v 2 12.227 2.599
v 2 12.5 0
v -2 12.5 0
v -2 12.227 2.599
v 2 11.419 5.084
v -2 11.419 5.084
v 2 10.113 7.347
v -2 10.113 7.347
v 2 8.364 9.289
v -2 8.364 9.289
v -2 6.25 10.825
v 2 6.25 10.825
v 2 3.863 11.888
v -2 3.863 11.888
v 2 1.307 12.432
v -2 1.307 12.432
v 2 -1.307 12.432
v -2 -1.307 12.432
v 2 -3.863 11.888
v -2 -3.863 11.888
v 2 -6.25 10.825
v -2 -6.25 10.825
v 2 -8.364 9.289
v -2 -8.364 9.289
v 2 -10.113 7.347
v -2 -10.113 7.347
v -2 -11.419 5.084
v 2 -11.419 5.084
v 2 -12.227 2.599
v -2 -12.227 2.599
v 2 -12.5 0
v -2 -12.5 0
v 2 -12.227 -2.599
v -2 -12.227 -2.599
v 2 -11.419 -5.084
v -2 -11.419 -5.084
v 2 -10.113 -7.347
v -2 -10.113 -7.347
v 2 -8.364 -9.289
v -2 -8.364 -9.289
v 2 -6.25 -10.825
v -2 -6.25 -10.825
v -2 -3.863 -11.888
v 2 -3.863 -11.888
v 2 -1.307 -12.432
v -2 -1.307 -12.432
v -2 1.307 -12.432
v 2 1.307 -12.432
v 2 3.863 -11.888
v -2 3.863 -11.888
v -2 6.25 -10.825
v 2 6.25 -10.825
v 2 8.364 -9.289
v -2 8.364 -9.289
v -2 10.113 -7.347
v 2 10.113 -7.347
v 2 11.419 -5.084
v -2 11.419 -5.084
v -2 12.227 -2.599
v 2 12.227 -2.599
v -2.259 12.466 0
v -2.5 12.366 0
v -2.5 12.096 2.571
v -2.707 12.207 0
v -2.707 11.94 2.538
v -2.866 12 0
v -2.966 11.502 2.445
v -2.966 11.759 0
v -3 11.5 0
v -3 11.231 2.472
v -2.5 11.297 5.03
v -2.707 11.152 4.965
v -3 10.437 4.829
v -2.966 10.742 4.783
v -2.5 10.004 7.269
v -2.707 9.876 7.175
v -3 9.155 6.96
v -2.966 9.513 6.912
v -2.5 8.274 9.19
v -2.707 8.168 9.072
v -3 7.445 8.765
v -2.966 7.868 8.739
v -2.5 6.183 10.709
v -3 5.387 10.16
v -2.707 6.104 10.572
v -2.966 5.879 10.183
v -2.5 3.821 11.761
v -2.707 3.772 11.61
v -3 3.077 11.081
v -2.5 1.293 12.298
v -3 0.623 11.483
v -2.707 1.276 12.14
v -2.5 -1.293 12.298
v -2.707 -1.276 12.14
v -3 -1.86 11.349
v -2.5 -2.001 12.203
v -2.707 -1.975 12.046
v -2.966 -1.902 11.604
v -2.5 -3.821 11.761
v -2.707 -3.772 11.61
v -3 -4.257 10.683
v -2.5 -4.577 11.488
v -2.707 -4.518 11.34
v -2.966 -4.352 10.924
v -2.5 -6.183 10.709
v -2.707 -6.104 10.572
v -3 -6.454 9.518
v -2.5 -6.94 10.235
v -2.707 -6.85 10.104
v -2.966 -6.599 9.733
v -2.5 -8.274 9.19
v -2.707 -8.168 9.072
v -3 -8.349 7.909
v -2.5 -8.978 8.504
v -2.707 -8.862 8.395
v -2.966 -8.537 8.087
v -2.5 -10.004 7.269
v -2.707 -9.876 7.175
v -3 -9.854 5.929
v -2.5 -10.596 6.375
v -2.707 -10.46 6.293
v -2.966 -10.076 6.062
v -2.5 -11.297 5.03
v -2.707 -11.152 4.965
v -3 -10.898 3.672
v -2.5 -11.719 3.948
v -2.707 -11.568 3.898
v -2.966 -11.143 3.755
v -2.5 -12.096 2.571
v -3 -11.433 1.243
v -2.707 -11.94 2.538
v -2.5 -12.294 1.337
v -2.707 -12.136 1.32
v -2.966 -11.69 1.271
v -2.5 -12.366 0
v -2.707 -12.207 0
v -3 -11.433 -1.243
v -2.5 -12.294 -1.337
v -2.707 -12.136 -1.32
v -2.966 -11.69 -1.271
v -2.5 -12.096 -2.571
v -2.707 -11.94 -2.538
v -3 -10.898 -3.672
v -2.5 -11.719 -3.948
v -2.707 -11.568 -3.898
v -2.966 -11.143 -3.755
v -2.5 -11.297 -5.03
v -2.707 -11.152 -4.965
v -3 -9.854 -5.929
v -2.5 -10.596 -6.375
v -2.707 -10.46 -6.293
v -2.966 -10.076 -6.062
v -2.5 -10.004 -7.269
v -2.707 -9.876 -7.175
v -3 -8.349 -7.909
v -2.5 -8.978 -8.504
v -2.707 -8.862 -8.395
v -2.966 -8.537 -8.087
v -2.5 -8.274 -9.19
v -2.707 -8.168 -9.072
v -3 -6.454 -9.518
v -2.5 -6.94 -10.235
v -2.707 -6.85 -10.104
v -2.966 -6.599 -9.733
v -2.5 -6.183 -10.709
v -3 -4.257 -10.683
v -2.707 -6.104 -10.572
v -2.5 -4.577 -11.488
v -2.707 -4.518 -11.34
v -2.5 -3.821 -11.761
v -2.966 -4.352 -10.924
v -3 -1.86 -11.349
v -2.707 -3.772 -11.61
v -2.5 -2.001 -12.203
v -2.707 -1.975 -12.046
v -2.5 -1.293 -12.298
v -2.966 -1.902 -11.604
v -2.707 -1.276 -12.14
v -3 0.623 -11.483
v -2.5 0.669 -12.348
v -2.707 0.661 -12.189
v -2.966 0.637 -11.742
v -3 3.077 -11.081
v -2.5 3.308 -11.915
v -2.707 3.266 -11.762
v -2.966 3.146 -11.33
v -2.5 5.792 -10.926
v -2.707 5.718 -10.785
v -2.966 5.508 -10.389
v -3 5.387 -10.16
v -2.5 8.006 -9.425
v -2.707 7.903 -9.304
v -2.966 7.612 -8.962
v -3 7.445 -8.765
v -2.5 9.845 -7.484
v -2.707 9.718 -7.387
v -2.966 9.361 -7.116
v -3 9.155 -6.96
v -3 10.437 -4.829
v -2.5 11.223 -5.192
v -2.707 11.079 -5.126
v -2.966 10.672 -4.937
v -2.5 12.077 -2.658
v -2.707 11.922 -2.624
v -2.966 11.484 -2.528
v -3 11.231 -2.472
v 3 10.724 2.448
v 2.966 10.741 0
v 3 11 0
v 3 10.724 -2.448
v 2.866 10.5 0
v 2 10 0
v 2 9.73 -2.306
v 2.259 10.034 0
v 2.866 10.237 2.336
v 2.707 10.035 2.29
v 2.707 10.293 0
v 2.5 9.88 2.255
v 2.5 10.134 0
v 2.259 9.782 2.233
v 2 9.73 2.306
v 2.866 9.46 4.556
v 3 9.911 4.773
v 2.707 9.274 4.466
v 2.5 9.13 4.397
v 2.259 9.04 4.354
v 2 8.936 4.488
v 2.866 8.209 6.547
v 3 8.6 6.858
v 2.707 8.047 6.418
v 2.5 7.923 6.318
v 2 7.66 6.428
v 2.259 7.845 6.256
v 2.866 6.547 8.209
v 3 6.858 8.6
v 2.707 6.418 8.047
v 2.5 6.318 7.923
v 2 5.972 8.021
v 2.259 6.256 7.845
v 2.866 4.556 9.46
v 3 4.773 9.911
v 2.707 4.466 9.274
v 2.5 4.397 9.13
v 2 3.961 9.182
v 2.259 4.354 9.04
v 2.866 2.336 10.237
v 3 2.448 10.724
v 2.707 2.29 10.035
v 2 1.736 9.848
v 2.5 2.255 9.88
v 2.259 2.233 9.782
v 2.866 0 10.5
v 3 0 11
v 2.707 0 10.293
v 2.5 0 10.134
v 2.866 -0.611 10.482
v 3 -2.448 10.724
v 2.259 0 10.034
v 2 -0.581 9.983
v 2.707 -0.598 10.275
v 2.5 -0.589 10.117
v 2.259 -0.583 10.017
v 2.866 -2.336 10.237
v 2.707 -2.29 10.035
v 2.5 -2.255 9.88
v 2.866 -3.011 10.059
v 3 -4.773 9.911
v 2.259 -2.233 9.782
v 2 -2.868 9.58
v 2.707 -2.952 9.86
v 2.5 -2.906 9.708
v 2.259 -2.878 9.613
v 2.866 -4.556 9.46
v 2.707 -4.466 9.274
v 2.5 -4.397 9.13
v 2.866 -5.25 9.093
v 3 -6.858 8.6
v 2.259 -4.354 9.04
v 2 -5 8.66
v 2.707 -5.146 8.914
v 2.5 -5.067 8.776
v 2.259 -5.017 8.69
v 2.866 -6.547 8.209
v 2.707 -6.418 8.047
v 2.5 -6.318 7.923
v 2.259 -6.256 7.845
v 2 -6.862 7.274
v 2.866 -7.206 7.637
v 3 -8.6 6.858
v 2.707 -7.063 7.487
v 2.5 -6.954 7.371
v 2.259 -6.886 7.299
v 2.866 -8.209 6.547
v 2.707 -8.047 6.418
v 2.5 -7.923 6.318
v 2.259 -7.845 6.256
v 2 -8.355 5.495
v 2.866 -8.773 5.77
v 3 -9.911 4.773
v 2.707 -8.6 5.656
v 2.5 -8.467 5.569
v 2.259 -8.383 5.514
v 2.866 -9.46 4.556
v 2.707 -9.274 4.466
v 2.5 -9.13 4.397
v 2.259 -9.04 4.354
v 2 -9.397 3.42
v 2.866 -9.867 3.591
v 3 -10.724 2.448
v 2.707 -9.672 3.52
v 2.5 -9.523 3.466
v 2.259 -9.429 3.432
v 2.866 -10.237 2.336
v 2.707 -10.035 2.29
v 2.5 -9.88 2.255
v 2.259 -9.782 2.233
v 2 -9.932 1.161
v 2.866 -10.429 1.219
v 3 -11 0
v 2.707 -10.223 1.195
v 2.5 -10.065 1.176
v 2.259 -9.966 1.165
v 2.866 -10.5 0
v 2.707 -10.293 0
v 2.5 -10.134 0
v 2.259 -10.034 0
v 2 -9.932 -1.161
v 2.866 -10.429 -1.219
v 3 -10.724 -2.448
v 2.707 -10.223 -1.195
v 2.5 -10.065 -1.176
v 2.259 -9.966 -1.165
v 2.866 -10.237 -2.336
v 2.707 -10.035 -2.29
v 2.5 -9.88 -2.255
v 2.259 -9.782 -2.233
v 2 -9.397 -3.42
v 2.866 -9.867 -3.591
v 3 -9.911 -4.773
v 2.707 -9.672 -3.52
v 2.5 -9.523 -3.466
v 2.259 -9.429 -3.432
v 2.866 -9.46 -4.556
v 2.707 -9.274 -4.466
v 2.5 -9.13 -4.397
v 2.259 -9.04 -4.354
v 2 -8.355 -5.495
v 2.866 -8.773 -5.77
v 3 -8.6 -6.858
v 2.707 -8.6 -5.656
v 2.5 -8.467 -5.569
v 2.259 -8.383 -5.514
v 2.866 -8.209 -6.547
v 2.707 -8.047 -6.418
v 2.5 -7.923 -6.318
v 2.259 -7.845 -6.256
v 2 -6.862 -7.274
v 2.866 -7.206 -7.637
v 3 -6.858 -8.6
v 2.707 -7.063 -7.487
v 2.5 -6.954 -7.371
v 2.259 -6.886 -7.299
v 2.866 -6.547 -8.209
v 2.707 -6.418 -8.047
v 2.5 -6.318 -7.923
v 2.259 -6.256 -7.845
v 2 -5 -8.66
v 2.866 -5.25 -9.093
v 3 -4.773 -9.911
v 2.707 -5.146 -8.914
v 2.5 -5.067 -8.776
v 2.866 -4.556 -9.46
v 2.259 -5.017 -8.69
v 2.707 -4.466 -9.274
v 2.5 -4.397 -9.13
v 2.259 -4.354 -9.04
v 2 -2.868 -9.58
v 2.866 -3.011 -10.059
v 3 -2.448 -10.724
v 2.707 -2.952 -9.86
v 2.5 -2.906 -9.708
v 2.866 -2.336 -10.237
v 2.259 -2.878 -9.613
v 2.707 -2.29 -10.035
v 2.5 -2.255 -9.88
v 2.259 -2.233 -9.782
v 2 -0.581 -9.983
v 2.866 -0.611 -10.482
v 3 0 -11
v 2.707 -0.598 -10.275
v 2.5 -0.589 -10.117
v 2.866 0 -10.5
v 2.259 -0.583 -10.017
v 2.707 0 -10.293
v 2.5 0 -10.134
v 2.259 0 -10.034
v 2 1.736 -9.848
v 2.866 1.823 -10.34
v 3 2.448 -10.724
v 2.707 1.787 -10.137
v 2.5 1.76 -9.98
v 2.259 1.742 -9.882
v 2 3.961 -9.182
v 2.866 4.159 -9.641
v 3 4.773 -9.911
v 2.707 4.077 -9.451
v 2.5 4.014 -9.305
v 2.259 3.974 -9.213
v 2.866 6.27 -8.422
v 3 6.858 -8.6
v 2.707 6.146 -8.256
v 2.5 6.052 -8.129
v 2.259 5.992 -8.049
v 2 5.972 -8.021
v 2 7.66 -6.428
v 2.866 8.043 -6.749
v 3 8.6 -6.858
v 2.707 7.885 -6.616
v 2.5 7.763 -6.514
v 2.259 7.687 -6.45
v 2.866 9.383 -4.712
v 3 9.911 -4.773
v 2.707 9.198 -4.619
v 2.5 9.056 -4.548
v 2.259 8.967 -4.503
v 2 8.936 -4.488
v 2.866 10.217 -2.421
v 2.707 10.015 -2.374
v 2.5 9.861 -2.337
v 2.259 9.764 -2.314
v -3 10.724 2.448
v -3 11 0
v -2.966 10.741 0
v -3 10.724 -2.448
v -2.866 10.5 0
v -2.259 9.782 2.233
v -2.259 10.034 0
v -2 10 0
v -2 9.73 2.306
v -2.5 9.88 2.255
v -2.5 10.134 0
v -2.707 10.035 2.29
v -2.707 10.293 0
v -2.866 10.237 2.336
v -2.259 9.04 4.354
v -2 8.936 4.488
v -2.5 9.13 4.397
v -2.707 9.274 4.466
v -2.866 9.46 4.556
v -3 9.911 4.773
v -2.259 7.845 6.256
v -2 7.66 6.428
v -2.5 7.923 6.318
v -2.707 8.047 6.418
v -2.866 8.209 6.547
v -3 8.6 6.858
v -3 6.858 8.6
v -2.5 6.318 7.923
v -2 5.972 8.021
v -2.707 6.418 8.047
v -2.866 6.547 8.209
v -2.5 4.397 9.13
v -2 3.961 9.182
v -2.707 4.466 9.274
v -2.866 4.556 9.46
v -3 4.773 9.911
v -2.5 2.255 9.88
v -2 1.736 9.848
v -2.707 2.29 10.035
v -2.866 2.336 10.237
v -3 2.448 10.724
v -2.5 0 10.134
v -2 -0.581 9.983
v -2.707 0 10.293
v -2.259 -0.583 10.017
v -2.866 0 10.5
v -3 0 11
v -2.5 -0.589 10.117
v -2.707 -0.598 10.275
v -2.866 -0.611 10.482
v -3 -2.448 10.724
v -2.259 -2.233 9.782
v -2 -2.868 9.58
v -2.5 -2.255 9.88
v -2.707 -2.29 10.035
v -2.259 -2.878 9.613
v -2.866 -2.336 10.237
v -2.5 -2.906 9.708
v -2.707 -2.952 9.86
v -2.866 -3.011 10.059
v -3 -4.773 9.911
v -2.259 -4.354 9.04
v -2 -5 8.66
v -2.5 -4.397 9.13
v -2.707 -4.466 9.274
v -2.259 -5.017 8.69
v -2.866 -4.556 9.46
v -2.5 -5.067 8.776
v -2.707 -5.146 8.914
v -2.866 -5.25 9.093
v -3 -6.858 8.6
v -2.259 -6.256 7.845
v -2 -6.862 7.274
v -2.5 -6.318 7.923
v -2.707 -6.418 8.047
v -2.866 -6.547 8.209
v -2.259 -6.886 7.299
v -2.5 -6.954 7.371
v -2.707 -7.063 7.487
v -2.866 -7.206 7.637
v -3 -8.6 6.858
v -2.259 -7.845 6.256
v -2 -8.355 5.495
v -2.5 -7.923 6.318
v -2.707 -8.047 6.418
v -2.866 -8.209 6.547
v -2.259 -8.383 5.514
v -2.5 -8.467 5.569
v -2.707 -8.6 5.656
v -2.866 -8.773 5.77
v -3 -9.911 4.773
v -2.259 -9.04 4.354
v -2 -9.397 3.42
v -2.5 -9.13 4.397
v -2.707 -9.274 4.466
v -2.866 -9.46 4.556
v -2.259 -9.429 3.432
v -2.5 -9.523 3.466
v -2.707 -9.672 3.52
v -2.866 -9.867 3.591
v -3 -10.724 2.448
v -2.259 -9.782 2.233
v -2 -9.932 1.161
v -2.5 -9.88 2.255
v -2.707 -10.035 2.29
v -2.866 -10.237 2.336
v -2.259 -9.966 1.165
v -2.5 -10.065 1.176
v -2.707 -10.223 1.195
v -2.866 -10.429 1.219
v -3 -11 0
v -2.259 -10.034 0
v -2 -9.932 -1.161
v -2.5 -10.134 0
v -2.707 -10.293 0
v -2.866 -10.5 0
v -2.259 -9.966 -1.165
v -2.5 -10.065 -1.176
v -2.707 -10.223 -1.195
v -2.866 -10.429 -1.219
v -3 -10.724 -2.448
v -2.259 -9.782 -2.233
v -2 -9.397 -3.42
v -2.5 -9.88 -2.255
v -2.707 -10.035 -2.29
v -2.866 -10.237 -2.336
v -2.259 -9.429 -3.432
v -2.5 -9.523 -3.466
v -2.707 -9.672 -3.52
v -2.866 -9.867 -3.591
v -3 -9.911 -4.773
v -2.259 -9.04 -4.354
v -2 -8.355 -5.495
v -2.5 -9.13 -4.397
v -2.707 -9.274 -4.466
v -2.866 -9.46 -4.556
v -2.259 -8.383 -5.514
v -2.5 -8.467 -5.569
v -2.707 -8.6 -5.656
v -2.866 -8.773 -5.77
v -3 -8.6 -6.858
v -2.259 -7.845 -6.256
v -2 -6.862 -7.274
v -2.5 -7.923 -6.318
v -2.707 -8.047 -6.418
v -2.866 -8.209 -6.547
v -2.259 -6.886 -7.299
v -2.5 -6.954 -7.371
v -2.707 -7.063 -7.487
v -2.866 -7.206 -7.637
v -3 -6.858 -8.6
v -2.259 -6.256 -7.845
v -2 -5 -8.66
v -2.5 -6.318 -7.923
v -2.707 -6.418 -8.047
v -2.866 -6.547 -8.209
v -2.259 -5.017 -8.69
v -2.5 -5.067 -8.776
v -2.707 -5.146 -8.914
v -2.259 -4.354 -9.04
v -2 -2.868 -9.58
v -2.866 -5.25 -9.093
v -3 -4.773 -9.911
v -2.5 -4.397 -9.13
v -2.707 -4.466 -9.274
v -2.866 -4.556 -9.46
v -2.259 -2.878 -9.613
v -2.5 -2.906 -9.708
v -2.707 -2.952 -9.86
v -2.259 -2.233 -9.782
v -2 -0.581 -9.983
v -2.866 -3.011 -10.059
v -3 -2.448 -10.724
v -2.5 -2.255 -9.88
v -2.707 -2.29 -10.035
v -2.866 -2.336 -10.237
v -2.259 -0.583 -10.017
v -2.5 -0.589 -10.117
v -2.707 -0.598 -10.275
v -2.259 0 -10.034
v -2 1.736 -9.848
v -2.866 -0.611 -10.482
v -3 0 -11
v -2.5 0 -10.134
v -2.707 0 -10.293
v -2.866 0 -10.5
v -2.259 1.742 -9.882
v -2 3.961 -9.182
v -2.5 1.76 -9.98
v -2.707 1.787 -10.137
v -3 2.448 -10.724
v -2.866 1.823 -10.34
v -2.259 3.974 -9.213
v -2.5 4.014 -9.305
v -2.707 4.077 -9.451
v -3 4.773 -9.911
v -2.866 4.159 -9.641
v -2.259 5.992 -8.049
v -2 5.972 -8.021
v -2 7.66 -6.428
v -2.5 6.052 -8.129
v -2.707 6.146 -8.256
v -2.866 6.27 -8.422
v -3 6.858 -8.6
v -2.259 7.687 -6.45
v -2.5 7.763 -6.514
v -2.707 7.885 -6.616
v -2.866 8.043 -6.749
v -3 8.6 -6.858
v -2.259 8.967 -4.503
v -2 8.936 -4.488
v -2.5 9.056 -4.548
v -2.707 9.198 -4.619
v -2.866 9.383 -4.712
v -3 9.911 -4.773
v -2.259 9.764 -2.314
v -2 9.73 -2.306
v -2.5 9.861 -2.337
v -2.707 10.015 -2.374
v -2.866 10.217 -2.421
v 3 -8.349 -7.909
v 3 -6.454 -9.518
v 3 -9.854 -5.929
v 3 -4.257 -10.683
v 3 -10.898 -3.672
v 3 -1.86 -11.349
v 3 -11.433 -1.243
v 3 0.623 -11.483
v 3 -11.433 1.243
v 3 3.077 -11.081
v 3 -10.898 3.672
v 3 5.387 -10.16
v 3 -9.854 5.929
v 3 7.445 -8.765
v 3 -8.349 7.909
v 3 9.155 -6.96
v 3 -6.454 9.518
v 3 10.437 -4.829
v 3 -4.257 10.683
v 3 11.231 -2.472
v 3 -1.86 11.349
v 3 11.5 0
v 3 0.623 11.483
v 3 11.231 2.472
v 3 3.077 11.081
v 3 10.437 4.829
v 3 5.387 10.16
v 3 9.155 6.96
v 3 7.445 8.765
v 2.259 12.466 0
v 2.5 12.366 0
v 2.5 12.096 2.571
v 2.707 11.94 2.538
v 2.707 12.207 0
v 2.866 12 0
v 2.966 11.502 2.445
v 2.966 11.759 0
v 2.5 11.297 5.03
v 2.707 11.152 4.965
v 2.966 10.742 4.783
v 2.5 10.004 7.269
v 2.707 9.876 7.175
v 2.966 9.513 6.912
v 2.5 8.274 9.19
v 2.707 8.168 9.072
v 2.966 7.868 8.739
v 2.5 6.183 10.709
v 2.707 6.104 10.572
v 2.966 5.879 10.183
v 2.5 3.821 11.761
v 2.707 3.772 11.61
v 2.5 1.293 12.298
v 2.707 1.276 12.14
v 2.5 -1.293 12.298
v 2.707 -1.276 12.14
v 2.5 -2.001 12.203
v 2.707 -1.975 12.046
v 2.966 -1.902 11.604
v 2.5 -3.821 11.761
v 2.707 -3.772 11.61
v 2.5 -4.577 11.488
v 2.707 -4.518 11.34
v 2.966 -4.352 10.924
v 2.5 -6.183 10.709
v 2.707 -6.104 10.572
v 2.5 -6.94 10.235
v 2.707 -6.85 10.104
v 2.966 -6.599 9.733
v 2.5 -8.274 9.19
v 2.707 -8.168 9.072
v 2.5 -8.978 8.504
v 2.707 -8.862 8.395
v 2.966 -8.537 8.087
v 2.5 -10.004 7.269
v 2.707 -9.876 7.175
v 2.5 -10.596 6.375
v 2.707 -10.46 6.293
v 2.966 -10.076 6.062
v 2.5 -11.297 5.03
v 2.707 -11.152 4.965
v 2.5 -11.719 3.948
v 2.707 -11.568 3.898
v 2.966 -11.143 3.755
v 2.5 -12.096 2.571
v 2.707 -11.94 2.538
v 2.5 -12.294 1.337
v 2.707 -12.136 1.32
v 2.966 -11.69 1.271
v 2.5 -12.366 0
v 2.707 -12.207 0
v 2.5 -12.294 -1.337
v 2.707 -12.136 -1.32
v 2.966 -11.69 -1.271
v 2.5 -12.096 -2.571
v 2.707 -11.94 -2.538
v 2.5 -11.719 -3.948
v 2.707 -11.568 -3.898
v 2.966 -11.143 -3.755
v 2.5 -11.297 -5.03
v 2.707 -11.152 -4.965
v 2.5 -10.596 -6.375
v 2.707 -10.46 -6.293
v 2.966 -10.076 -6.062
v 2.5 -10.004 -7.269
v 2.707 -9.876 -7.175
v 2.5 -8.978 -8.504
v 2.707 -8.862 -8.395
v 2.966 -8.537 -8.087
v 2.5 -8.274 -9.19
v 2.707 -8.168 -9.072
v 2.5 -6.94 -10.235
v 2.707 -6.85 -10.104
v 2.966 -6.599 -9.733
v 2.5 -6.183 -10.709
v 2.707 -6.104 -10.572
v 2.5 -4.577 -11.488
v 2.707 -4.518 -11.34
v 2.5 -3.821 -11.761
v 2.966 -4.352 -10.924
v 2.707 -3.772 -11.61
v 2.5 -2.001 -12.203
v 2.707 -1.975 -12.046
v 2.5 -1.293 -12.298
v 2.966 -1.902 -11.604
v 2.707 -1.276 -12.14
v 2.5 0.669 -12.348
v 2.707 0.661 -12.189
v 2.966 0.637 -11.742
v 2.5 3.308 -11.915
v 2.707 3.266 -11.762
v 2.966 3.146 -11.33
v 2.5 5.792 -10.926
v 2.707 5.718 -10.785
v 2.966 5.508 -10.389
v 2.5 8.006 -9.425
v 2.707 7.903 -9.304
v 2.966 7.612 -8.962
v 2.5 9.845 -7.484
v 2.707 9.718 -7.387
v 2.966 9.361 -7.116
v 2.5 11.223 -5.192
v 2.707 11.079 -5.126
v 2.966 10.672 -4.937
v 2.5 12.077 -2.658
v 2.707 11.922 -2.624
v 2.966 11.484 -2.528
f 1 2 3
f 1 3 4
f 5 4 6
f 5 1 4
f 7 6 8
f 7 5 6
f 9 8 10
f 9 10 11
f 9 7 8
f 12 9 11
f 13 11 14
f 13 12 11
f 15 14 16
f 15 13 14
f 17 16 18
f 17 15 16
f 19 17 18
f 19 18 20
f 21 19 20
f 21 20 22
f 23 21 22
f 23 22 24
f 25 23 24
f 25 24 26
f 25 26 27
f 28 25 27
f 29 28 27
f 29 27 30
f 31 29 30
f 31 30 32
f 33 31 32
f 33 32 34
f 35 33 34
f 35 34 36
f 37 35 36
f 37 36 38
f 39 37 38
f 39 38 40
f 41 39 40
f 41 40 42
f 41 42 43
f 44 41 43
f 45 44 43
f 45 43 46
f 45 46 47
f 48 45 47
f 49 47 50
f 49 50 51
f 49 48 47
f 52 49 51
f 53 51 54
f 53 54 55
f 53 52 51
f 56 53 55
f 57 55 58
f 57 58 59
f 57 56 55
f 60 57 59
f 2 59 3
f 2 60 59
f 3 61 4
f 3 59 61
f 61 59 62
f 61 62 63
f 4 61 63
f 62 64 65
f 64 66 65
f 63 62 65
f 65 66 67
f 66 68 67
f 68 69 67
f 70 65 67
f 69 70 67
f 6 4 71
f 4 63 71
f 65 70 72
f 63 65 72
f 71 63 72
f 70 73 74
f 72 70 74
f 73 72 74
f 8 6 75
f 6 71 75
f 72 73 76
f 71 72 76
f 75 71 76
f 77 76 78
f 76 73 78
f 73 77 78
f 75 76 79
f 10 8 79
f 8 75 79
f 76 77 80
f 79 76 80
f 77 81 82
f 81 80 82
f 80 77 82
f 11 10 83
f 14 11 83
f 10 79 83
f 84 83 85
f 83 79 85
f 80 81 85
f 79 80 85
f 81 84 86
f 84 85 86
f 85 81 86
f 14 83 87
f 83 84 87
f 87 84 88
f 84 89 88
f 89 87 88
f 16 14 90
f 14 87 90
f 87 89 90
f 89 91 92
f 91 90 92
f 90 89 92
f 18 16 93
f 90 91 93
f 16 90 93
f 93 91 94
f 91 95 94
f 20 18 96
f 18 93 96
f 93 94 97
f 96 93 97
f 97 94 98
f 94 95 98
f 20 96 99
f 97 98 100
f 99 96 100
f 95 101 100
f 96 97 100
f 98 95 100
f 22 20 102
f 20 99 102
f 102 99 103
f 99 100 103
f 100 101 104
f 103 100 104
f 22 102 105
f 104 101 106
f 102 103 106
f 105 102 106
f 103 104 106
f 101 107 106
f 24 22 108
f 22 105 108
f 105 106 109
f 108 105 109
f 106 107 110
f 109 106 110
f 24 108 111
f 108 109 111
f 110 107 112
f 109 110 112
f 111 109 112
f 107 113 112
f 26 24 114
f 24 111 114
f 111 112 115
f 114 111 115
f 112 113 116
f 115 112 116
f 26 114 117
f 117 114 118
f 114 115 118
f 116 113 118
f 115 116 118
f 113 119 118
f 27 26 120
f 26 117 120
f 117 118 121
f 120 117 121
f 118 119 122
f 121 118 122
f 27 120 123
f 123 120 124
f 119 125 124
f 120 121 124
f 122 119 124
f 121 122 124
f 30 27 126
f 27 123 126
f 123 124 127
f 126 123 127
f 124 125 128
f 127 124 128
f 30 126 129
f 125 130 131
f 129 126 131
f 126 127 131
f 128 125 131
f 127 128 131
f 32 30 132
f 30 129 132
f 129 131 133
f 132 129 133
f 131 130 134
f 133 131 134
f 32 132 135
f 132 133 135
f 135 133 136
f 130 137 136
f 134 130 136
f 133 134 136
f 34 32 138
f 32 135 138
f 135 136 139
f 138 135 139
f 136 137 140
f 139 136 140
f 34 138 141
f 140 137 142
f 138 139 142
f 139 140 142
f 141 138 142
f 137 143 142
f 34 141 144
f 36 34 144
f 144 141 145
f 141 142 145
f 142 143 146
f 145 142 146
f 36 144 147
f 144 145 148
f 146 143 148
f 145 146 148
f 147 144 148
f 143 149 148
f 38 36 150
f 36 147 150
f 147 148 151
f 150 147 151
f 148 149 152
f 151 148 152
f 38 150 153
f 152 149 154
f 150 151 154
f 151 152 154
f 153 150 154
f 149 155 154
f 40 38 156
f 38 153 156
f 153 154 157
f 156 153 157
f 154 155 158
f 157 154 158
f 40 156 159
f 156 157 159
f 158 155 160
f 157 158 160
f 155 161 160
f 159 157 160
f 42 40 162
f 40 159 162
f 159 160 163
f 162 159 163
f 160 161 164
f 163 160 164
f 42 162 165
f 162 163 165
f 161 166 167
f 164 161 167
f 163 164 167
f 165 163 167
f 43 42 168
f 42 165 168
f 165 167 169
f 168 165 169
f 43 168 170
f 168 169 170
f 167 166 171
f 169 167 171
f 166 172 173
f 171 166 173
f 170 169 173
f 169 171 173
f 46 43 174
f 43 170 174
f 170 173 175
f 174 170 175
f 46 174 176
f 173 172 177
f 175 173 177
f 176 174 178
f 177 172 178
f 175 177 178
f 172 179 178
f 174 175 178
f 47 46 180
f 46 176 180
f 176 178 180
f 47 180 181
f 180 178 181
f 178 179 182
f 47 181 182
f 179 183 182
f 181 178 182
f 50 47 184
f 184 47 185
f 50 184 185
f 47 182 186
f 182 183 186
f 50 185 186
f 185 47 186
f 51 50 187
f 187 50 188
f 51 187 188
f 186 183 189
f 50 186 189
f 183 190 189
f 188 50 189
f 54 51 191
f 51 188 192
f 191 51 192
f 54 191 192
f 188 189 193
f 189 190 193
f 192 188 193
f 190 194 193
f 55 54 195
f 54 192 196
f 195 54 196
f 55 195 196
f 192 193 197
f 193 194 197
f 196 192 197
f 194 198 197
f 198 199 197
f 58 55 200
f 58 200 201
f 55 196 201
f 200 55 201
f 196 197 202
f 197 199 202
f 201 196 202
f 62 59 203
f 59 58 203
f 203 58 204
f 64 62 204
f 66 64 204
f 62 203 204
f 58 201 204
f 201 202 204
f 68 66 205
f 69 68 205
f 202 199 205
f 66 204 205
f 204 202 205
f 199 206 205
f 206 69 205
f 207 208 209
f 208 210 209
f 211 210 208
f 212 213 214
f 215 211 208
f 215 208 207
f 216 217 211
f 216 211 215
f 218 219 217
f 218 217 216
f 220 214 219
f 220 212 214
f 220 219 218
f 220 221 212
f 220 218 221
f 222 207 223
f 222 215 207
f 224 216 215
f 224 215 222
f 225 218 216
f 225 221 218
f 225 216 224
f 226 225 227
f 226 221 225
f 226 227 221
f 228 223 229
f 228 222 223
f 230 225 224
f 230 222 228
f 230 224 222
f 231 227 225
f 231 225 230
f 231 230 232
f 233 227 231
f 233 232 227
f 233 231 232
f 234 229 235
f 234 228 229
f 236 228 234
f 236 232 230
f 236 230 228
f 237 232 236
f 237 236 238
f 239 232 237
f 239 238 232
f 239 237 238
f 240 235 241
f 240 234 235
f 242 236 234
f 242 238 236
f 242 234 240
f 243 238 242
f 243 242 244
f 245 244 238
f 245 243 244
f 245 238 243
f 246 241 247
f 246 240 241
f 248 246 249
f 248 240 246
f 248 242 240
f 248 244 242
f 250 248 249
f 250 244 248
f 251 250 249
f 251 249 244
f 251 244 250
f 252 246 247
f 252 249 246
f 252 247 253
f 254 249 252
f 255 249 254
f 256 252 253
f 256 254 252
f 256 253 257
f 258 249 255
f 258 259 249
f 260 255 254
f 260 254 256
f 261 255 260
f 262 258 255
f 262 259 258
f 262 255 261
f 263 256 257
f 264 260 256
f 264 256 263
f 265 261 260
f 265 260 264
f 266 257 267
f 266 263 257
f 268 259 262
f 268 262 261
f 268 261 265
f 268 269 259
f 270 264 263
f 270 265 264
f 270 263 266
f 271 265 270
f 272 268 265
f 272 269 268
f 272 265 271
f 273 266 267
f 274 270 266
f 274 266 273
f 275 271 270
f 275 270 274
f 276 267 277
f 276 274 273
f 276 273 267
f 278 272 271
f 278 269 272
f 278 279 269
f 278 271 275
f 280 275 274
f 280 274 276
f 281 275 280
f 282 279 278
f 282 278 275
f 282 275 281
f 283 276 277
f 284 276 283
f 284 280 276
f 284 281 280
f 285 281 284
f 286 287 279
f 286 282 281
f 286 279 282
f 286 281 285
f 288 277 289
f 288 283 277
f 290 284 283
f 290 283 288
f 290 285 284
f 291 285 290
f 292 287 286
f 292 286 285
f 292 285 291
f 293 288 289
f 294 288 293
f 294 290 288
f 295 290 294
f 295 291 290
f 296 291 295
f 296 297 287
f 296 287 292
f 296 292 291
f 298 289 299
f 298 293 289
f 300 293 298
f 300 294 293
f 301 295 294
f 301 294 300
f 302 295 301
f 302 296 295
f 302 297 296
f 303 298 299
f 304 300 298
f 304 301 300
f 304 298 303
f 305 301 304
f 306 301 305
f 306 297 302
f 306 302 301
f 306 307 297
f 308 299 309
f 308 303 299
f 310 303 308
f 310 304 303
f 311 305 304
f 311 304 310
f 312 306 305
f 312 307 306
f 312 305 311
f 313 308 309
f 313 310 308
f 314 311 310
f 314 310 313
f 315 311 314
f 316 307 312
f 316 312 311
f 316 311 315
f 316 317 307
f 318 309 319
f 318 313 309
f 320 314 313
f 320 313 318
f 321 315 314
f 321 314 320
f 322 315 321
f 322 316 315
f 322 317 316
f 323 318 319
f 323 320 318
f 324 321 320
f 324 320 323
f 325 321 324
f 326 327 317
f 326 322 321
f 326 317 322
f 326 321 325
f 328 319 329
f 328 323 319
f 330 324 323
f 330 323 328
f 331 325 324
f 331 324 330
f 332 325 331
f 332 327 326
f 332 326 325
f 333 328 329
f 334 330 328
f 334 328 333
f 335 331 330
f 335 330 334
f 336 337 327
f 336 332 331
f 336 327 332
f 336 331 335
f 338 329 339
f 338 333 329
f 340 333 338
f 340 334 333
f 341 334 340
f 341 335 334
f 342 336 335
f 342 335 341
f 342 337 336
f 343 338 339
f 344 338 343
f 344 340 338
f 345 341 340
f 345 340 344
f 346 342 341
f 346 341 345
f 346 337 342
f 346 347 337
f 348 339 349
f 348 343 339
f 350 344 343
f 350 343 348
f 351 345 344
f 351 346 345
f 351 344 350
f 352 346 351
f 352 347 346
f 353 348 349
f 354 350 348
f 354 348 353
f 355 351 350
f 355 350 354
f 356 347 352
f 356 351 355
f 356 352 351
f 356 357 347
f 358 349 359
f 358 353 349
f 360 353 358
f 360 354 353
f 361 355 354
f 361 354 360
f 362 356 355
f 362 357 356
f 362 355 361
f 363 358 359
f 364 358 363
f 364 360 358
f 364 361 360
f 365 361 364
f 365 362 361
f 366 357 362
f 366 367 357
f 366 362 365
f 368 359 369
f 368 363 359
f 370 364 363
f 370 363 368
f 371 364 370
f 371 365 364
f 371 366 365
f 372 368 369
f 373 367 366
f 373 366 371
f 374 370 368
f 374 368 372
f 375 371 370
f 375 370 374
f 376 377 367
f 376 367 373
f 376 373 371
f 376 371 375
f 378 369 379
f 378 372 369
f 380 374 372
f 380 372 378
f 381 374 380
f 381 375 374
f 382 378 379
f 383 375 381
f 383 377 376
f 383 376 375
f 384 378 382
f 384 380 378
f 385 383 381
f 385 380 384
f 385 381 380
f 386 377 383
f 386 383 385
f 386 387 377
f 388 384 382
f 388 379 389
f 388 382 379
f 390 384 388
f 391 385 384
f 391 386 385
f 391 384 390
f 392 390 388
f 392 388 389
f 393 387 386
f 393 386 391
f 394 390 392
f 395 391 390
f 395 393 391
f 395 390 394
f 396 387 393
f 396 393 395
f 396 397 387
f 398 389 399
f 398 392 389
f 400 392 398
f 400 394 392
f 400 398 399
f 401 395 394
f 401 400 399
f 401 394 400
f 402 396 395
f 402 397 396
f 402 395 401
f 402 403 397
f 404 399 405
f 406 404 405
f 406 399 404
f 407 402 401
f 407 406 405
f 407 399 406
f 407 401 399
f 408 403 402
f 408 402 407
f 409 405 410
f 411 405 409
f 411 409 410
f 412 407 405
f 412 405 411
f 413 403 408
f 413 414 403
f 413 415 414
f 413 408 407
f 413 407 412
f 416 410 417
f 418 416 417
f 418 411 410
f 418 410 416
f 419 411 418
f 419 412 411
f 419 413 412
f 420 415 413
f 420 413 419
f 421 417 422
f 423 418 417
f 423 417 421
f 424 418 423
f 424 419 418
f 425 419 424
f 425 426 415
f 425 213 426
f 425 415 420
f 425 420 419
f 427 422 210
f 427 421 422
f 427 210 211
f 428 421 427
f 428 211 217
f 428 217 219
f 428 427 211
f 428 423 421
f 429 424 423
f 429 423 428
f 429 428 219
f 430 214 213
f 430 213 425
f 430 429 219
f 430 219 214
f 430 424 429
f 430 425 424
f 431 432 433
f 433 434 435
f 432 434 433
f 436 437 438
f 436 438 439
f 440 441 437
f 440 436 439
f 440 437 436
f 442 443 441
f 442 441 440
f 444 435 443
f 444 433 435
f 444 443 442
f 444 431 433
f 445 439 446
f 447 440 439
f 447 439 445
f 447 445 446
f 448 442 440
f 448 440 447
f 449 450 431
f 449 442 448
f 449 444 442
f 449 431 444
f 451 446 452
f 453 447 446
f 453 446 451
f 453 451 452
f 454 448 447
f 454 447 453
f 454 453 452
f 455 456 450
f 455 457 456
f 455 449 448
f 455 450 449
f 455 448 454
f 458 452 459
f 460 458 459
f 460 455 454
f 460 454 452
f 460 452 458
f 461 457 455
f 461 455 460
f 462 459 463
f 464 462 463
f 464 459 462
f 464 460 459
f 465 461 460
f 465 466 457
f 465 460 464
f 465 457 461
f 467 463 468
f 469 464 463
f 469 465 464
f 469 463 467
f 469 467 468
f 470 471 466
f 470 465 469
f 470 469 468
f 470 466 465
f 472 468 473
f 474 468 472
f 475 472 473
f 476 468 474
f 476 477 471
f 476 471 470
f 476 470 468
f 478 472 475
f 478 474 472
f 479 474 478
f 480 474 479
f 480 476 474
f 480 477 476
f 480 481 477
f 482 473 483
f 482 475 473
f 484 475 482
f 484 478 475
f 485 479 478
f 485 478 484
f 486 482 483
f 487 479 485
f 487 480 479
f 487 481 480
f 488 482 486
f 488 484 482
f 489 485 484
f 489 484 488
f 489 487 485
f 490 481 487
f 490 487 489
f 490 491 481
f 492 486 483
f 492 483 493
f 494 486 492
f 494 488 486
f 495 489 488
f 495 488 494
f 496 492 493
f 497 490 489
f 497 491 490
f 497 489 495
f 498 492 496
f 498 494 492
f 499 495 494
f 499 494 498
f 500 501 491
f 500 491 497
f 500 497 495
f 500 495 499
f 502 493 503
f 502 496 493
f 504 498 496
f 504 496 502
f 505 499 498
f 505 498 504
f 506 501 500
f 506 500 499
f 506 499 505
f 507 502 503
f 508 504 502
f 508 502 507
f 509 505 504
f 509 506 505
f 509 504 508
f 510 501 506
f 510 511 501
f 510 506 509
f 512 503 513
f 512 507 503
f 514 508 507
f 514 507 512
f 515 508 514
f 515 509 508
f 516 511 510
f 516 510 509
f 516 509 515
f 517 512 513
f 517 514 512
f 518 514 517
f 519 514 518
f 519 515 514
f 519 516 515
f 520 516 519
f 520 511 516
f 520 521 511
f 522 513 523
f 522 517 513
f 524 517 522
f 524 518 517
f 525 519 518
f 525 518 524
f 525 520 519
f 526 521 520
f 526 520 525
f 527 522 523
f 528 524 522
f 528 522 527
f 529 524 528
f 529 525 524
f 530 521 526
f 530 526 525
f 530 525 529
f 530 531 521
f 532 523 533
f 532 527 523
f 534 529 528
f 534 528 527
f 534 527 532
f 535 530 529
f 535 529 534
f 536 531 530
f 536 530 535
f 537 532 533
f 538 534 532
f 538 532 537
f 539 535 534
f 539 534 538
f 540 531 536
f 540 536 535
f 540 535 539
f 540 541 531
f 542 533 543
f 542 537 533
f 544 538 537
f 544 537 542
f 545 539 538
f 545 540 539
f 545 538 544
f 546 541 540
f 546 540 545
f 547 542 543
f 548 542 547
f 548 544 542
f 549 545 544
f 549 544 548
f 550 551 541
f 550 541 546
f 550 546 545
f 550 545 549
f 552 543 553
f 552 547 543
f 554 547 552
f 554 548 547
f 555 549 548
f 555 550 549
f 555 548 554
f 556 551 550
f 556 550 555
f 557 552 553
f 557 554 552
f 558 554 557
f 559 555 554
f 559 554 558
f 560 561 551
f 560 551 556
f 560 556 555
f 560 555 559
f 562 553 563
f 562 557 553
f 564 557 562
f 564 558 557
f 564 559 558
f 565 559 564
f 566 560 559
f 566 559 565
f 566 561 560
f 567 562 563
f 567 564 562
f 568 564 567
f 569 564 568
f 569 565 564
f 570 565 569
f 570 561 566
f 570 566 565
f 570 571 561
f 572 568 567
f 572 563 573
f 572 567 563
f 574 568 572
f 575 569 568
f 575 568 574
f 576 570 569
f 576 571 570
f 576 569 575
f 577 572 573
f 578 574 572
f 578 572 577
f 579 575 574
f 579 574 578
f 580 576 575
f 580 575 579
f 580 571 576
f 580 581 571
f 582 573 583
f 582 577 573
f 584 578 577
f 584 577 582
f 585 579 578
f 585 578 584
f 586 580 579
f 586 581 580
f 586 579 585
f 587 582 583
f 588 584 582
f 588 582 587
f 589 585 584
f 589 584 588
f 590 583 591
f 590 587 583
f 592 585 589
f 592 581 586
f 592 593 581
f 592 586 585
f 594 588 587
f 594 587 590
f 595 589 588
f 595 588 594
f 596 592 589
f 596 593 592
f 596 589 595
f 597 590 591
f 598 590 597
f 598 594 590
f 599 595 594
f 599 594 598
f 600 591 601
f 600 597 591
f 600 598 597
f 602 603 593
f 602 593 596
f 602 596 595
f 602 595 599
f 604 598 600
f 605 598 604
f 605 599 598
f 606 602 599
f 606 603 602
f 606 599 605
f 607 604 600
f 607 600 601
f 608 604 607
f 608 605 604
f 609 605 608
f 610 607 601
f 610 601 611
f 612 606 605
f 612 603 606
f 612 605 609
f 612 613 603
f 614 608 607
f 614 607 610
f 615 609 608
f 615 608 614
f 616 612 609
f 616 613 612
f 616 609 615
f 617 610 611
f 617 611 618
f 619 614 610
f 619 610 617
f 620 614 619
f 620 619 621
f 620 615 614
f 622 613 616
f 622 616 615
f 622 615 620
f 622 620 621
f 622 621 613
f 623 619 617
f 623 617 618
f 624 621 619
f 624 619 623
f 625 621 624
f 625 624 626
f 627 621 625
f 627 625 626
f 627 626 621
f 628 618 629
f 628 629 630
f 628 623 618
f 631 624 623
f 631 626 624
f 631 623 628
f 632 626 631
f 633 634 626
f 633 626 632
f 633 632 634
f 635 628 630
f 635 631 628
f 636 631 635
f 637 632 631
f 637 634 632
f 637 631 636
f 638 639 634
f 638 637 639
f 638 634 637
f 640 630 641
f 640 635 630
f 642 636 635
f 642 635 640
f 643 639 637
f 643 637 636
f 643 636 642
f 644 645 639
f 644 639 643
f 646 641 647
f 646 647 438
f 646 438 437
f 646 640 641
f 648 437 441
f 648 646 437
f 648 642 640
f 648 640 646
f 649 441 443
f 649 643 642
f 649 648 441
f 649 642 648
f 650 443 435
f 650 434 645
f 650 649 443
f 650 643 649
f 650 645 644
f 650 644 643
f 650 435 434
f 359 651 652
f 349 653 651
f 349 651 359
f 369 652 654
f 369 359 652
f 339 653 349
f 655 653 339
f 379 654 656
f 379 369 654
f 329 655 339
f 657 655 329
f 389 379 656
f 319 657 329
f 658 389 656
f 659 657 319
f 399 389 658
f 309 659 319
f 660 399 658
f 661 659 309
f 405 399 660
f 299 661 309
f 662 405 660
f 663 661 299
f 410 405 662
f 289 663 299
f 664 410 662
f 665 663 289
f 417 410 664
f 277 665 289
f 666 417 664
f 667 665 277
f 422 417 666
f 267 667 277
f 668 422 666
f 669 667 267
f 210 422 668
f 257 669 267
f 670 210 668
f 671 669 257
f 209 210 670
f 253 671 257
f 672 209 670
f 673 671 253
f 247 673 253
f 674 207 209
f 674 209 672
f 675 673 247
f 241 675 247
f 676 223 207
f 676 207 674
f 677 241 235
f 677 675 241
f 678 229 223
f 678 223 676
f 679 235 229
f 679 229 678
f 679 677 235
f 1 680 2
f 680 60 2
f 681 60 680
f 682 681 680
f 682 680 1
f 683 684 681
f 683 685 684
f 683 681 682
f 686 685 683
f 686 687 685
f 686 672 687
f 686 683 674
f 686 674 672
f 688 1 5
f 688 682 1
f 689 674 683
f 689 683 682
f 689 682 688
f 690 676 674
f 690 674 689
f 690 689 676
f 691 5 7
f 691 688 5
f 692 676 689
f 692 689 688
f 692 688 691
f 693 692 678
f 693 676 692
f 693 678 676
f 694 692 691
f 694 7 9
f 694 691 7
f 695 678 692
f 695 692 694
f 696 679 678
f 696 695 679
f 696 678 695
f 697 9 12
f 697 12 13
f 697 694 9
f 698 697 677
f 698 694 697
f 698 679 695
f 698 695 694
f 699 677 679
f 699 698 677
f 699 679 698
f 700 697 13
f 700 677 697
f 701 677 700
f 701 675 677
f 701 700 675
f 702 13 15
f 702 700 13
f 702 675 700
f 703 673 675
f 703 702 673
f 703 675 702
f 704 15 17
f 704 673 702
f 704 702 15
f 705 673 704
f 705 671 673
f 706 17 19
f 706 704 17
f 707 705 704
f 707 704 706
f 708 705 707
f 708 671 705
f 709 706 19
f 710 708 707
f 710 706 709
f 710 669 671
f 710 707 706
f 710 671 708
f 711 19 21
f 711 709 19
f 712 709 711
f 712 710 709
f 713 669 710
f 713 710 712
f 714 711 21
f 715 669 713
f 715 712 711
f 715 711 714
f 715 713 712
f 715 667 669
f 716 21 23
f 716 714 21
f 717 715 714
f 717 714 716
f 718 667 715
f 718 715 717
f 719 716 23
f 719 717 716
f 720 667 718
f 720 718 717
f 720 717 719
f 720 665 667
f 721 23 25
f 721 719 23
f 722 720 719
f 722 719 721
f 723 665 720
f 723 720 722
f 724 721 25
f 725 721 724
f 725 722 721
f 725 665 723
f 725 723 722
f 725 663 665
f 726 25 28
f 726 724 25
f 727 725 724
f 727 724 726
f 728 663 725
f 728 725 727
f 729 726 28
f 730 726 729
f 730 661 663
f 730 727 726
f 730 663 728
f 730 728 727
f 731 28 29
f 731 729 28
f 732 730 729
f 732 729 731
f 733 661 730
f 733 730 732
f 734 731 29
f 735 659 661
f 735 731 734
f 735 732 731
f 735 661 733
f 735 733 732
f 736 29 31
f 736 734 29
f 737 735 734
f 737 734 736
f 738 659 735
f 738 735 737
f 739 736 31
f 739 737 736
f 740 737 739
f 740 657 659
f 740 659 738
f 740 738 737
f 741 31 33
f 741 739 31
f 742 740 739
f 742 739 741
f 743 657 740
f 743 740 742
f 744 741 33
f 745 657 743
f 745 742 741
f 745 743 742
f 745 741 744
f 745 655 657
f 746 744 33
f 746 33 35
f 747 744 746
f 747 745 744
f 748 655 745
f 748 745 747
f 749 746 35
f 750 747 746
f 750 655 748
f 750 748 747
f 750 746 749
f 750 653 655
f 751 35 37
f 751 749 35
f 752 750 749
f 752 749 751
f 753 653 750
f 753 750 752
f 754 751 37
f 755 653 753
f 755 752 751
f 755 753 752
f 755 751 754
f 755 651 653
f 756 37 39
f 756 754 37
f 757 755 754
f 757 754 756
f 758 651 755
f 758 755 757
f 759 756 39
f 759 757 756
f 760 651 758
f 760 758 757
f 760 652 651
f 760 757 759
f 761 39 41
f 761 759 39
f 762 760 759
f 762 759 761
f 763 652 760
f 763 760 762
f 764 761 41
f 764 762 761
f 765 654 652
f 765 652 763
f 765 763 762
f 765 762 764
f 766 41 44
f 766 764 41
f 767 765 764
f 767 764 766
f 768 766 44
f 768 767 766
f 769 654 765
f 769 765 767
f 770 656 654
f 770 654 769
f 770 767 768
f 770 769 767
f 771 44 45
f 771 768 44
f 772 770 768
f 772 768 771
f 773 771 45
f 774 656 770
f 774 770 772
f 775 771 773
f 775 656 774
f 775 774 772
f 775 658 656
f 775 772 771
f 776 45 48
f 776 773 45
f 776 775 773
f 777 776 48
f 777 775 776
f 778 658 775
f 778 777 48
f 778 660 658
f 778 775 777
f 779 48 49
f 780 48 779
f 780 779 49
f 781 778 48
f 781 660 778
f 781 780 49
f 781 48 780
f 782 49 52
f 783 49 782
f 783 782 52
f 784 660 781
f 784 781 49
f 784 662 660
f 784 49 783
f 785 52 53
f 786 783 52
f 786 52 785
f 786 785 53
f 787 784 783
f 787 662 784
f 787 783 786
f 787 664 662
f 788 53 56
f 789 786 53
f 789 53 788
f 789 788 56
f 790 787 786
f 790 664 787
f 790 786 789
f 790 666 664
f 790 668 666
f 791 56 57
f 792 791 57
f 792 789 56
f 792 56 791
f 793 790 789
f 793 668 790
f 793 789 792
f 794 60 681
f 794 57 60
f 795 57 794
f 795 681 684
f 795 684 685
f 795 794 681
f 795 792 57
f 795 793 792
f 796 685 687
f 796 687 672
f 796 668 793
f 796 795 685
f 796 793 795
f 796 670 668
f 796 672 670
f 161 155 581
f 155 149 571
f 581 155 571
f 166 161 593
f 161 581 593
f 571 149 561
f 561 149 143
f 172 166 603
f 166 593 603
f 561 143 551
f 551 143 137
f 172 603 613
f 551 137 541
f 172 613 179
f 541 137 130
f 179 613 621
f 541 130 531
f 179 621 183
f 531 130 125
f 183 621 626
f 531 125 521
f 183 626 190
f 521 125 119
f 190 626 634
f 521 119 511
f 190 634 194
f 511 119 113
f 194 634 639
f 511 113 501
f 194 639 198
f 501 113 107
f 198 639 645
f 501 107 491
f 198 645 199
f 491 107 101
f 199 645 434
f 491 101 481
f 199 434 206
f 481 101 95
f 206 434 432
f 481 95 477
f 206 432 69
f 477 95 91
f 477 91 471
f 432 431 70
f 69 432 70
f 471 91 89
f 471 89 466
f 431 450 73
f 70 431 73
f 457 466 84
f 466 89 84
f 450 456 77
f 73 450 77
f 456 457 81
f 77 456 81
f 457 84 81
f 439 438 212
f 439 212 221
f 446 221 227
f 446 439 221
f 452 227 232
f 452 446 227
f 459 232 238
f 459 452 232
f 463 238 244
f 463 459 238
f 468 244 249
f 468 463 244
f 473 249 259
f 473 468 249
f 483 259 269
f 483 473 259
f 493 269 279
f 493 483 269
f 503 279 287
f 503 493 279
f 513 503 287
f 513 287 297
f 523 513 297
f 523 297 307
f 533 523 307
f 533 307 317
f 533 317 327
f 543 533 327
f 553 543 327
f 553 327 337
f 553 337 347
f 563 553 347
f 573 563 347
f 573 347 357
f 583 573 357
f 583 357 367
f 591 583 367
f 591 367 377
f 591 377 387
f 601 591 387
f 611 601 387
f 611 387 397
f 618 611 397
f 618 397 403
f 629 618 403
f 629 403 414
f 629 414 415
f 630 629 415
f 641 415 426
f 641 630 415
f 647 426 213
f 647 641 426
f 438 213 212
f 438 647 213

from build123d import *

# Parameters (mm, degrees)
F0_R     = 12.5
F0_R_2   = 10
F1_DEPTH = 3
F2_R     = 1


with BuildPart() as f1:
    # F0 (on Right) → F1 (new body, symmetric)
    with BuildSketch(Plane.YZ):
        Circle(F0_R)
        Circle(F0_R_2, mode=Mode.SUBTRACT)
    extrude(amount=F1_DEPTH, both=True)

    # F2
    f2_edges = [f1.edges().sort_by_distance(p)[0] for p in [
        (3, -12.5, 0),
        (3, -10, 0),
        (-3, -10, 0),
        (-3, -12.5, 0),
    ]]
    fillet(f2_edges, radius=F2_R)


solid = f1.part
